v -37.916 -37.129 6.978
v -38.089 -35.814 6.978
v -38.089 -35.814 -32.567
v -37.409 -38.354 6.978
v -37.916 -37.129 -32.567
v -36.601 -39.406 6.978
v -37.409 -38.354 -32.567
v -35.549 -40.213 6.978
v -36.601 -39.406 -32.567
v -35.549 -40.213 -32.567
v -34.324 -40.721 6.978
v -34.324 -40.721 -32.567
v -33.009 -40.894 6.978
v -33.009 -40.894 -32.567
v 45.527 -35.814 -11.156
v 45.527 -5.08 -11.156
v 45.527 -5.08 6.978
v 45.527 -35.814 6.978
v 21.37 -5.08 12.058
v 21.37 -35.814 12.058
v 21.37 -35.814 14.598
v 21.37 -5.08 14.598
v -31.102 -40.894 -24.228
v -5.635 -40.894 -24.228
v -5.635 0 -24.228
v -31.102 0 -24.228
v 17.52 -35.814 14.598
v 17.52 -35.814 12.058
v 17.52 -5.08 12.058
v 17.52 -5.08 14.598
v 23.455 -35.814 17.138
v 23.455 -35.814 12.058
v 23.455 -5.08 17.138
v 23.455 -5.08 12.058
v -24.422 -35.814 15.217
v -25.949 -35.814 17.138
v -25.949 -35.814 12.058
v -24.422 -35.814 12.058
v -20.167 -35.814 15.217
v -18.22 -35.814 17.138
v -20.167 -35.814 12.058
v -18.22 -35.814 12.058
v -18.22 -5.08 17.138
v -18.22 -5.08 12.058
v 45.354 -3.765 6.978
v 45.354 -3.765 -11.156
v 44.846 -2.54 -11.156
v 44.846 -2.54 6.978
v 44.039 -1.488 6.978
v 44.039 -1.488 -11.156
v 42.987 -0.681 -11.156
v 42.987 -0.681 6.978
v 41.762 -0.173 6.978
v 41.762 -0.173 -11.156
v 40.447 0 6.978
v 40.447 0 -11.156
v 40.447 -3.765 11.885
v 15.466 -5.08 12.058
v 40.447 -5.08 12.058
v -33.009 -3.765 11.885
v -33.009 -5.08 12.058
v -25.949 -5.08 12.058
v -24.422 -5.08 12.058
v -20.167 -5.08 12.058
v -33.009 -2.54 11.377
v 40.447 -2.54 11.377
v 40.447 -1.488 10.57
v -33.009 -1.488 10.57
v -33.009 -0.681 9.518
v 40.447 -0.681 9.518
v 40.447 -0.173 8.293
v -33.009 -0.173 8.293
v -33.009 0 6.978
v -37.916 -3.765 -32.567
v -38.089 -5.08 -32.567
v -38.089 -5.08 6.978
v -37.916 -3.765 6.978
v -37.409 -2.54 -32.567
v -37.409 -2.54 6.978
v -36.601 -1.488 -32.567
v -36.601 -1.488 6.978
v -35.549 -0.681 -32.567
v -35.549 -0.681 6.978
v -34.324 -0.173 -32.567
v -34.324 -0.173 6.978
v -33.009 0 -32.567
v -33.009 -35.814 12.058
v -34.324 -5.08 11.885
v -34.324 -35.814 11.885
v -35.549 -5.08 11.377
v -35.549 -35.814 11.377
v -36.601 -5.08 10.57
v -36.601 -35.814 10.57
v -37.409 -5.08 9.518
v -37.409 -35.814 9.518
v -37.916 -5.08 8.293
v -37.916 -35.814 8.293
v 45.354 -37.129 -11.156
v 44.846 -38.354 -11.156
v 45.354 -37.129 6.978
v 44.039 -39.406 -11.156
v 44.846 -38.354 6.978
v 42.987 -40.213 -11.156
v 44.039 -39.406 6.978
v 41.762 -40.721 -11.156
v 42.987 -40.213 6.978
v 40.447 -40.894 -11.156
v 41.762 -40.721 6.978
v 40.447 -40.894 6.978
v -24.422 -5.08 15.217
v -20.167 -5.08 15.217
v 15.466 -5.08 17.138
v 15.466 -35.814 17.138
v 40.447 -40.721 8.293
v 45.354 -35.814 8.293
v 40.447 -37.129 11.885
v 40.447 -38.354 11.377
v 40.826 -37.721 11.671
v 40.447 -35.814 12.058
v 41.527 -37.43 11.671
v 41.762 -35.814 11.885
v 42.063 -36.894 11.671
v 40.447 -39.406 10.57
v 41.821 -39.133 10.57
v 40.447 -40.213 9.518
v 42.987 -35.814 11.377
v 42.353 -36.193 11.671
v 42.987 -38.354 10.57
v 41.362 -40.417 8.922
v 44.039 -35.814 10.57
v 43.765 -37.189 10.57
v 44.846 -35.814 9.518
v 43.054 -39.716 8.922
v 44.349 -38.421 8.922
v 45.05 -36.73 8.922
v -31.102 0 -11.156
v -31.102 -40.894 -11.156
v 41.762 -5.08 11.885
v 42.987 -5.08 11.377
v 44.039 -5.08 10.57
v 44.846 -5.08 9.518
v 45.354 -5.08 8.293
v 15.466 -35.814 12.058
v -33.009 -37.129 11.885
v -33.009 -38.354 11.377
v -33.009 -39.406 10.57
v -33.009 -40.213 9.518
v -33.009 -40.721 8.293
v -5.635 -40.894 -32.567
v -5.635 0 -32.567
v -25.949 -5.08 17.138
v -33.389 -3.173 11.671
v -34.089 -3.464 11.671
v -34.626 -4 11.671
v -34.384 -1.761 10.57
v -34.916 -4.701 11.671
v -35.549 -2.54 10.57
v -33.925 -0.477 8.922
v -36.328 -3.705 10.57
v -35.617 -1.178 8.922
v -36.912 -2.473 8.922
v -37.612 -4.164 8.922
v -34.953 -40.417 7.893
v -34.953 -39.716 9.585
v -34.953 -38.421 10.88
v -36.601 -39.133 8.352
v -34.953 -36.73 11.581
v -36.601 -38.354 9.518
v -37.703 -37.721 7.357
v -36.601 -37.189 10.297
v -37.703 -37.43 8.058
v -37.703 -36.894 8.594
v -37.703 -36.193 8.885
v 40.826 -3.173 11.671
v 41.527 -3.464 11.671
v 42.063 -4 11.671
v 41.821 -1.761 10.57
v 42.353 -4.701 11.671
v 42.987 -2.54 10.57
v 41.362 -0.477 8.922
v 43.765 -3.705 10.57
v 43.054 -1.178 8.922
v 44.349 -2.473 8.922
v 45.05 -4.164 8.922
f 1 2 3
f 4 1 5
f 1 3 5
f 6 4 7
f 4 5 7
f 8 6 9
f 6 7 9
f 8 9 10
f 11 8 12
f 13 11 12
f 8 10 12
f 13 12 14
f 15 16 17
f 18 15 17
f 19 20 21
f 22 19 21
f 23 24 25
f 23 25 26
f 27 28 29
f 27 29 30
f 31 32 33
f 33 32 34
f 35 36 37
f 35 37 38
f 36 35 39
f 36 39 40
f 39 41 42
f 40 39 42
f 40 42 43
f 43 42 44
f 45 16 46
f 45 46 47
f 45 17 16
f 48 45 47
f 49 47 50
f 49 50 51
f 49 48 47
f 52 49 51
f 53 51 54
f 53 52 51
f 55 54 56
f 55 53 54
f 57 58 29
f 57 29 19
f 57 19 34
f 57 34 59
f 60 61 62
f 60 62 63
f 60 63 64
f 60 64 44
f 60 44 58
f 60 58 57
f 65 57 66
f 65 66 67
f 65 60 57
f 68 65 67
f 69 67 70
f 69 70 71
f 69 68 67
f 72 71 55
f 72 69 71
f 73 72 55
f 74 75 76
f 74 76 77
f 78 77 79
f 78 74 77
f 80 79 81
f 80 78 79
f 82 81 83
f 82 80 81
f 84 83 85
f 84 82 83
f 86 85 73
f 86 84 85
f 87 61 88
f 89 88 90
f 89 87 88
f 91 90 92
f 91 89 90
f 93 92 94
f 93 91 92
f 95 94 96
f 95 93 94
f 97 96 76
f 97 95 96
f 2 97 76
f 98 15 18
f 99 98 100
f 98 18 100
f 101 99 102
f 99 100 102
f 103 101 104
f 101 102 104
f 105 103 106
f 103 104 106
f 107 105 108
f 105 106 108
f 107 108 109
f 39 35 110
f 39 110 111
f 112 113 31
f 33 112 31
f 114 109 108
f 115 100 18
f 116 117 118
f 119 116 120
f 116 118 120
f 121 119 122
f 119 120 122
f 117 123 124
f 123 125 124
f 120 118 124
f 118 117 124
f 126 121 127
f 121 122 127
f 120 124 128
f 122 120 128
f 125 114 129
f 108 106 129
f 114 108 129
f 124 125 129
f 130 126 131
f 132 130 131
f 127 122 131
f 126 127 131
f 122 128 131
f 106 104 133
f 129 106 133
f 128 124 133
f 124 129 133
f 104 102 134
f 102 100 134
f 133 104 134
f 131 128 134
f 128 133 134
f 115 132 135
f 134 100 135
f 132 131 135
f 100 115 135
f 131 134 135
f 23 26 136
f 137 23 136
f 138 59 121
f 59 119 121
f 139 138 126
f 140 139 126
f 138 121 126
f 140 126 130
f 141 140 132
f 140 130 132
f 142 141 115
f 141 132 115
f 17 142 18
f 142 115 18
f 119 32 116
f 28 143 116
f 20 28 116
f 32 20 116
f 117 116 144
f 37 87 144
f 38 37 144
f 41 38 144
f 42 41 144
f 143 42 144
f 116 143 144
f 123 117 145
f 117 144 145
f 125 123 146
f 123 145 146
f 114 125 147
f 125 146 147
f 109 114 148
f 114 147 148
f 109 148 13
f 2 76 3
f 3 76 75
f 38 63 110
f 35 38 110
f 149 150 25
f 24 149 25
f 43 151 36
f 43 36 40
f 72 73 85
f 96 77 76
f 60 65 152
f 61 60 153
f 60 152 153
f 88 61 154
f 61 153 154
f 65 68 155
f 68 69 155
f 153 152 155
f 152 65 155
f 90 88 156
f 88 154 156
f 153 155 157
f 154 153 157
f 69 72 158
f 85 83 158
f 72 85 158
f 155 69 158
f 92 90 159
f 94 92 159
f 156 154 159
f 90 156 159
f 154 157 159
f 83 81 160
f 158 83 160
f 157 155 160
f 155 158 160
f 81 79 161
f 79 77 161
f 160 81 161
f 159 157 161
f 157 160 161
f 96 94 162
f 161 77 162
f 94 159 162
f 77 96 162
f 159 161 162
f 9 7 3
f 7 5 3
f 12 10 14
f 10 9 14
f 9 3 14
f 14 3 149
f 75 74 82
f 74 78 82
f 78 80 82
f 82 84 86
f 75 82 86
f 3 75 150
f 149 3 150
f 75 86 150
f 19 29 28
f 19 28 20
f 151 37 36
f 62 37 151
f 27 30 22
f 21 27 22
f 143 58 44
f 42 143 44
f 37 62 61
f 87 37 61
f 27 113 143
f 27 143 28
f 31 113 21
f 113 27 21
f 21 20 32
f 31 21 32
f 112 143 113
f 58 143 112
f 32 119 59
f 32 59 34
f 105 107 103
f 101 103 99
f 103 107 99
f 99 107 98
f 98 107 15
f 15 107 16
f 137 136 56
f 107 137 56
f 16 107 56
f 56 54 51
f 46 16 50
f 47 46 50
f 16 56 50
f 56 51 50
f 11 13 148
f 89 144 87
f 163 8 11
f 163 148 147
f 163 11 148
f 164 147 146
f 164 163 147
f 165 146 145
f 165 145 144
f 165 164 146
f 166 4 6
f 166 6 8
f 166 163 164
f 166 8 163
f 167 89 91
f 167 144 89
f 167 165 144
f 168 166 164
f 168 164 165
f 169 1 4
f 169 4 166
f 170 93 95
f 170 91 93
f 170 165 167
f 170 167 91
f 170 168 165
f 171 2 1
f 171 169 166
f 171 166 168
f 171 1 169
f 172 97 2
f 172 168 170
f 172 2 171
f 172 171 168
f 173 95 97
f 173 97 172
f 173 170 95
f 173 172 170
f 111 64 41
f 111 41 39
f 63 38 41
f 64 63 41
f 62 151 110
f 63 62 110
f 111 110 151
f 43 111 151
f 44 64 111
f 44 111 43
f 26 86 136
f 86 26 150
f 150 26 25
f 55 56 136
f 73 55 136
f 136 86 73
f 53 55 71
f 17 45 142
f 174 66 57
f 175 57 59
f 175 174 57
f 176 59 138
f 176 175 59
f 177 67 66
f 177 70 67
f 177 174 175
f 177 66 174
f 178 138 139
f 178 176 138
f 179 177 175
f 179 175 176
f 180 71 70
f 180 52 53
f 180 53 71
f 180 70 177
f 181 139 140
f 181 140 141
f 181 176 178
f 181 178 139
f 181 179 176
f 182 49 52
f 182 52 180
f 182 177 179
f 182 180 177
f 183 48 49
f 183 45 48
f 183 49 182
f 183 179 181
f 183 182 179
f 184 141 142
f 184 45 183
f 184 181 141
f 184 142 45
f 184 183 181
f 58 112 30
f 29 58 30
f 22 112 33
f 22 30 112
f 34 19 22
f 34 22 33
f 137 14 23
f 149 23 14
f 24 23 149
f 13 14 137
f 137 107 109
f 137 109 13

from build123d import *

# Parameters (mm, degrees)
F1_DEPTH    = 40.894
F2_R        = 5.08
F3_T1_DEPTH = 52.2452971888
F3_S5_W     = 5.08
F3_S5_H     = 5.08
F3_T6_DEPTH = 5.08
F4_W        = 7.728997618
F4_H        = 30.734
F4_W_2      = 7.9892426729
F5_DEPTH    = 5.08
F6_W        = 4.2550079525
F6_H        = 3.1596273184
F6_W_2      = 3.8497596979
F6_H_2      = 2.54
F7_DEPTH    = 39.37


# Not quite as in the source:
# - a fillet or chamfer that OpenCascade refuses, or shapes differently, is made with other operations: its cross-section is extruded or revolved along the edge and cut away or added
# - a feature of the source that left no trace in its solid (it failed there, or was rolled back) is left out


with BuildPart() as f1:
    # F0 (on Front) → F1 (new body)
    with BuildSketch(Plane.XZ):
        Polygon((45.526817441, 12.0578445494), (-38.0892679095, 12.0578445494), (-38.0892679095, -11.1563242972), (-38.0892679095, -32.5674526393), (-5.6345071644, -32.5674526393), (-5.6345071644, -24.228380993), (-31.1024785042, -24.228380993), (-31.1024785042, -11.1563242972), (45.526817441, -11.1563242972), align=None)
    extrude(amount=F1_DEPTH)

    # F2
    f2_edges = [f1.edges().sort_by_distance(p)[0] for p in [
        (45.526817, 0, 0.45076),
        (45.526817, -40.894, 0.45076),
        (-38.089268, 0, -10.254804),
        (3.718775, 0, 12.057845),
        (3.718775, -40.894, 12.057845),
        (45.526817, -20.447, 12.057845),
        (-38.089268, -20.447, 12.057845),
    ]]
    fillet(f2_edges, radius=F2_R)

    # F3: fillet of radius 5.08 on 1 edges, made by hand

    # F3_s2 → F3_t1 (cut)
    with BuildSketch(Plane.XY.offset(-45.2674526393)):
        with BuildLine():
            ThreePointArc((-38.0892679095, -35.814), (-36.601370358, -39.4061024484), (-33.0092679095, -40.894))
            Line((-33.0092679095, -40.894), (-38.0892679095, -40.894))
            Line((-38.0892679095, -40.894), (-38.0892679095, -35.814))
        make_face()
    extrude(amount=F3_T1_DEPTH, mode=Mode.SUBTRACT)


with BuildPart() as f3_tool4:
    # F3_s5 → F3_t6 (new body)
    with BuildSketch(Plane.YZ.offset(-33.0092679095)):
        with Locations((-38.354, 9.5178445494)):
            Rectangle(F3_S5_W, F3_S5_H)
    extrude(amount=-F3_T6_DEPTH)

    # F3_s7 → F3_t8 (revolve, cut)
    with BuildSketch(Plane(origin=(-33.0092679095, -35.814, 6.9778445494), x_dir=(0, 0.7071067812, -0.7071067812), z_dir=(0, 0.7071067812, 0.7071067812))):
        with BuildLine():
            ThreePointArc((0, -5.08), (5.08, 0), (0, 5.08))
            Line((0, 5.08), (0, -5.08))
        make_face()
    revolve(axis=Axis((-33.0092679095, -35.814, 6.9778445494), (-1, 0, 0)), mode=Mode.SUBTRACT)


with BuildPart() as f1_1:
    add(f1.part)

    # F3_t3: cut F3_tool4
    add(f3_tool4.part, mode=Mode.SUBTRACT)

    # F4 (on face) → F5 (join)
    with BuildSketch(Plane.XY.offset(12.0578445494)):
        with Locations((-22.0848601311, -20.447)):
            Rectangle(F4_W, F4_H)
        with Locations((19.4605253637, -20.447)):
            Rectangle(F4_W_2, F4_H)
    extrude(amount=F5_DEPTH)

    # F6 (on face) → F7 (cut)
    with BuildSketch(Plane.XZ.offset(35.814)):
        with Locations((-22.2941972315, 13.6376582086)):
            Rectangle(F6_W, F6_H)
        with Locations((19.4453038275, 13.3278445494)):
            Rectangle(F6_W_2, F6_H_2)
    extrude(amount=-F7_DEPTH, mode=Mode.SUBTRACT)


solid = f1_1.part
